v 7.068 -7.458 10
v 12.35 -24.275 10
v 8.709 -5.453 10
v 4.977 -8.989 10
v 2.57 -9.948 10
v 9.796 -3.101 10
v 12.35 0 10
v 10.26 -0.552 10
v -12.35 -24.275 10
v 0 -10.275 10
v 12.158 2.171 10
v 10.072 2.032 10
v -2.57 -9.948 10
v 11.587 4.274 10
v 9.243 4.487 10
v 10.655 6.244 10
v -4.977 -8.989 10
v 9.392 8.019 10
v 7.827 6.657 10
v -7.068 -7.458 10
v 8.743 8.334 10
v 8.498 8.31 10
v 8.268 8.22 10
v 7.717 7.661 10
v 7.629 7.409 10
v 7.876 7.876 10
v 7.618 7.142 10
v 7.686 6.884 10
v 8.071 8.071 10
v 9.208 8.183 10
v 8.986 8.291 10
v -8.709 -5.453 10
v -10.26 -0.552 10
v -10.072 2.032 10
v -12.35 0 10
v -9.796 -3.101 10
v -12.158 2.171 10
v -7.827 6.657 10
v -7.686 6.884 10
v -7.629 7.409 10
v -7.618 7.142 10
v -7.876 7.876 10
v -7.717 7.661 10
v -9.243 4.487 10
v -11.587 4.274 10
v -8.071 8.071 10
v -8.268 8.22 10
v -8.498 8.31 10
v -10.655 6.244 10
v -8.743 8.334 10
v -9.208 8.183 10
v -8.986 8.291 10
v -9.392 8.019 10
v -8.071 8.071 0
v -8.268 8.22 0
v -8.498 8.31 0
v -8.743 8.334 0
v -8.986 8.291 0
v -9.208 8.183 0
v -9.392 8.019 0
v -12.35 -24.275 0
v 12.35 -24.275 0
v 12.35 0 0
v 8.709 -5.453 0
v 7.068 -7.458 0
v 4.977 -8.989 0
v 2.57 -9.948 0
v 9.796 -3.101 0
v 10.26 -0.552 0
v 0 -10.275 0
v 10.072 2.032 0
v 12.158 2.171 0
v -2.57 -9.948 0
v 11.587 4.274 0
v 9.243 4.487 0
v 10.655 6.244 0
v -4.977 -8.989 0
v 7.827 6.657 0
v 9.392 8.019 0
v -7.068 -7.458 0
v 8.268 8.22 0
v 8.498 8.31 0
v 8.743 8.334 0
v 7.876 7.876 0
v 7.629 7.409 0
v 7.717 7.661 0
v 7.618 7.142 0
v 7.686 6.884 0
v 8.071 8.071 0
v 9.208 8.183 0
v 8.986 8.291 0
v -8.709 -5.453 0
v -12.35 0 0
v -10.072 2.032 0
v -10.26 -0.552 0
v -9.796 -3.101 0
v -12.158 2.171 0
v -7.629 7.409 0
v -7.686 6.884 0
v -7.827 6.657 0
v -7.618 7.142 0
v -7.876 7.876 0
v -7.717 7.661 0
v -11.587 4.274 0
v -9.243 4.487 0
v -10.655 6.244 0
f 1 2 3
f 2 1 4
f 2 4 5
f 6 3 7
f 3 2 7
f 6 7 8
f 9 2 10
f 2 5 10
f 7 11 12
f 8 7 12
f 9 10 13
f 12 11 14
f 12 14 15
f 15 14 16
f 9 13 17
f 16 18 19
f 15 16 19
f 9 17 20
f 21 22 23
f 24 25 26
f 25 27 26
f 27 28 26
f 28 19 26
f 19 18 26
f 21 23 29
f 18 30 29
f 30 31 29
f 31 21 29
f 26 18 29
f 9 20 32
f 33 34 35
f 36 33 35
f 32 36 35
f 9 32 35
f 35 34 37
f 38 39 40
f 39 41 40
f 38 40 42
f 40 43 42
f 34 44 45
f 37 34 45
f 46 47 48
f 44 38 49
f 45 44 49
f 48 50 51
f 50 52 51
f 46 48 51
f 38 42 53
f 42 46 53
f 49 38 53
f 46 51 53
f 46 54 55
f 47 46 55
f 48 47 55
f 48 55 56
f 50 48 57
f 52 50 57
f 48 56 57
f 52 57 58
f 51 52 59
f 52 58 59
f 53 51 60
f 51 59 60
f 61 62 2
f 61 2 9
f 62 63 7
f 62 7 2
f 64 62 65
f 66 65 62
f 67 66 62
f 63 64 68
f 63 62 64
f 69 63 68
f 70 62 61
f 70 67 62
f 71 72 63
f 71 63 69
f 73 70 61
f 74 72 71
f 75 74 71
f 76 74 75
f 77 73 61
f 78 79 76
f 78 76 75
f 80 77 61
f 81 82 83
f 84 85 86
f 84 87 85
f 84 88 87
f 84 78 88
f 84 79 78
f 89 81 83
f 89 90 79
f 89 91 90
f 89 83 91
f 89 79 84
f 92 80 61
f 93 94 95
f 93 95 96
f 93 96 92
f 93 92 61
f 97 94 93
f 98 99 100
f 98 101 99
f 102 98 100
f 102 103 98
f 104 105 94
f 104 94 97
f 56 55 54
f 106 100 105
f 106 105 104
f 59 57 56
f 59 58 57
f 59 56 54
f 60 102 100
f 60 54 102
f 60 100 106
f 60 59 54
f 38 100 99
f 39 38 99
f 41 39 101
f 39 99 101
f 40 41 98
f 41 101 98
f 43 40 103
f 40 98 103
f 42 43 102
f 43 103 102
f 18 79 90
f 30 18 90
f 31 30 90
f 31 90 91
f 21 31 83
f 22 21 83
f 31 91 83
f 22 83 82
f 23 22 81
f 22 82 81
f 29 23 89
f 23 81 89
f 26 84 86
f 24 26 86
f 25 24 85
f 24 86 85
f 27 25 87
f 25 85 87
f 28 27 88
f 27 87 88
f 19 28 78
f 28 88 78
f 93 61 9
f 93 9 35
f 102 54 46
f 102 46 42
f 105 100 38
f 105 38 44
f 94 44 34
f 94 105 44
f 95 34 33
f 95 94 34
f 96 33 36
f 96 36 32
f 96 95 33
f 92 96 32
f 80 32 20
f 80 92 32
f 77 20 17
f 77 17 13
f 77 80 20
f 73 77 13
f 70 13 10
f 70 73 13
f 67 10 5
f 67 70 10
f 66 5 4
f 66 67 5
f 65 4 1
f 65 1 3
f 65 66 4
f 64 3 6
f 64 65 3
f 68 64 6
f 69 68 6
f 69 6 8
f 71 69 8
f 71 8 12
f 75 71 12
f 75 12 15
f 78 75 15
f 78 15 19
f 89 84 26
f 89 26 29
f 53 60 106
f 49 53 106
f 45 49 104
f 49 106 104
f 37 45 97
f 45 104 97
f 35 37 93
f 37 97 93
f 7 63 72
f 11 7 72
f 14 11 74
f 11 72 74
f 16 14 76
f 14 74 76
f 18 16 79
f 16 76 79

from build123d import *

# Parameters (mm, degrees)
PAD_DEPTH = 10


with BuildPart() as part:
    # Sketch → Pad (new body)
    with BuildSketch(Plane.XY):
        with BuildLine():
            ThreePointArc((-7.827064, 6.656778), (0, -10.275), (7.827064, 6.656778))
            ThreePointArc((7.87625, 7.87625), (7.613377, 7.276125), (7.827064, 6.656778))
            Line((7.87625, 7.87625), (8.071323, 8.071323))
            ThreePointArc((9.392168, 8.019331), (8.743117, 8.33423), (8.071323, 8.071323))
            ThreePointArc((12.35, 0), (11.586971, 4.273712), (9.392168, 8.019331))
            Line((12.35, 0), (12.35, -24.275))
            Line((12.35, -24.275), (-12.35, -24.275))
            Line((-12.35, -24.275), (-12.35, 0))
            ThreePointArc((-9.392168, 8.019331), (-11.586971, 4.273712), (-12.35, 0))
            ThreePointArc((-8.071323, 8.071323), (-8.743117, 8.33423), (-9.392168, 8.019331))
            Line((-8.071323, 8.071323), (-7.87625, 7.87625))
            ThreePointArc((-7.827064, 6.656778), (-7.613377, 7.276125), (-7.87625, 7.87625))
        make_face()
    extrude(amount=PAD_DEPTH)


solid = part.part
